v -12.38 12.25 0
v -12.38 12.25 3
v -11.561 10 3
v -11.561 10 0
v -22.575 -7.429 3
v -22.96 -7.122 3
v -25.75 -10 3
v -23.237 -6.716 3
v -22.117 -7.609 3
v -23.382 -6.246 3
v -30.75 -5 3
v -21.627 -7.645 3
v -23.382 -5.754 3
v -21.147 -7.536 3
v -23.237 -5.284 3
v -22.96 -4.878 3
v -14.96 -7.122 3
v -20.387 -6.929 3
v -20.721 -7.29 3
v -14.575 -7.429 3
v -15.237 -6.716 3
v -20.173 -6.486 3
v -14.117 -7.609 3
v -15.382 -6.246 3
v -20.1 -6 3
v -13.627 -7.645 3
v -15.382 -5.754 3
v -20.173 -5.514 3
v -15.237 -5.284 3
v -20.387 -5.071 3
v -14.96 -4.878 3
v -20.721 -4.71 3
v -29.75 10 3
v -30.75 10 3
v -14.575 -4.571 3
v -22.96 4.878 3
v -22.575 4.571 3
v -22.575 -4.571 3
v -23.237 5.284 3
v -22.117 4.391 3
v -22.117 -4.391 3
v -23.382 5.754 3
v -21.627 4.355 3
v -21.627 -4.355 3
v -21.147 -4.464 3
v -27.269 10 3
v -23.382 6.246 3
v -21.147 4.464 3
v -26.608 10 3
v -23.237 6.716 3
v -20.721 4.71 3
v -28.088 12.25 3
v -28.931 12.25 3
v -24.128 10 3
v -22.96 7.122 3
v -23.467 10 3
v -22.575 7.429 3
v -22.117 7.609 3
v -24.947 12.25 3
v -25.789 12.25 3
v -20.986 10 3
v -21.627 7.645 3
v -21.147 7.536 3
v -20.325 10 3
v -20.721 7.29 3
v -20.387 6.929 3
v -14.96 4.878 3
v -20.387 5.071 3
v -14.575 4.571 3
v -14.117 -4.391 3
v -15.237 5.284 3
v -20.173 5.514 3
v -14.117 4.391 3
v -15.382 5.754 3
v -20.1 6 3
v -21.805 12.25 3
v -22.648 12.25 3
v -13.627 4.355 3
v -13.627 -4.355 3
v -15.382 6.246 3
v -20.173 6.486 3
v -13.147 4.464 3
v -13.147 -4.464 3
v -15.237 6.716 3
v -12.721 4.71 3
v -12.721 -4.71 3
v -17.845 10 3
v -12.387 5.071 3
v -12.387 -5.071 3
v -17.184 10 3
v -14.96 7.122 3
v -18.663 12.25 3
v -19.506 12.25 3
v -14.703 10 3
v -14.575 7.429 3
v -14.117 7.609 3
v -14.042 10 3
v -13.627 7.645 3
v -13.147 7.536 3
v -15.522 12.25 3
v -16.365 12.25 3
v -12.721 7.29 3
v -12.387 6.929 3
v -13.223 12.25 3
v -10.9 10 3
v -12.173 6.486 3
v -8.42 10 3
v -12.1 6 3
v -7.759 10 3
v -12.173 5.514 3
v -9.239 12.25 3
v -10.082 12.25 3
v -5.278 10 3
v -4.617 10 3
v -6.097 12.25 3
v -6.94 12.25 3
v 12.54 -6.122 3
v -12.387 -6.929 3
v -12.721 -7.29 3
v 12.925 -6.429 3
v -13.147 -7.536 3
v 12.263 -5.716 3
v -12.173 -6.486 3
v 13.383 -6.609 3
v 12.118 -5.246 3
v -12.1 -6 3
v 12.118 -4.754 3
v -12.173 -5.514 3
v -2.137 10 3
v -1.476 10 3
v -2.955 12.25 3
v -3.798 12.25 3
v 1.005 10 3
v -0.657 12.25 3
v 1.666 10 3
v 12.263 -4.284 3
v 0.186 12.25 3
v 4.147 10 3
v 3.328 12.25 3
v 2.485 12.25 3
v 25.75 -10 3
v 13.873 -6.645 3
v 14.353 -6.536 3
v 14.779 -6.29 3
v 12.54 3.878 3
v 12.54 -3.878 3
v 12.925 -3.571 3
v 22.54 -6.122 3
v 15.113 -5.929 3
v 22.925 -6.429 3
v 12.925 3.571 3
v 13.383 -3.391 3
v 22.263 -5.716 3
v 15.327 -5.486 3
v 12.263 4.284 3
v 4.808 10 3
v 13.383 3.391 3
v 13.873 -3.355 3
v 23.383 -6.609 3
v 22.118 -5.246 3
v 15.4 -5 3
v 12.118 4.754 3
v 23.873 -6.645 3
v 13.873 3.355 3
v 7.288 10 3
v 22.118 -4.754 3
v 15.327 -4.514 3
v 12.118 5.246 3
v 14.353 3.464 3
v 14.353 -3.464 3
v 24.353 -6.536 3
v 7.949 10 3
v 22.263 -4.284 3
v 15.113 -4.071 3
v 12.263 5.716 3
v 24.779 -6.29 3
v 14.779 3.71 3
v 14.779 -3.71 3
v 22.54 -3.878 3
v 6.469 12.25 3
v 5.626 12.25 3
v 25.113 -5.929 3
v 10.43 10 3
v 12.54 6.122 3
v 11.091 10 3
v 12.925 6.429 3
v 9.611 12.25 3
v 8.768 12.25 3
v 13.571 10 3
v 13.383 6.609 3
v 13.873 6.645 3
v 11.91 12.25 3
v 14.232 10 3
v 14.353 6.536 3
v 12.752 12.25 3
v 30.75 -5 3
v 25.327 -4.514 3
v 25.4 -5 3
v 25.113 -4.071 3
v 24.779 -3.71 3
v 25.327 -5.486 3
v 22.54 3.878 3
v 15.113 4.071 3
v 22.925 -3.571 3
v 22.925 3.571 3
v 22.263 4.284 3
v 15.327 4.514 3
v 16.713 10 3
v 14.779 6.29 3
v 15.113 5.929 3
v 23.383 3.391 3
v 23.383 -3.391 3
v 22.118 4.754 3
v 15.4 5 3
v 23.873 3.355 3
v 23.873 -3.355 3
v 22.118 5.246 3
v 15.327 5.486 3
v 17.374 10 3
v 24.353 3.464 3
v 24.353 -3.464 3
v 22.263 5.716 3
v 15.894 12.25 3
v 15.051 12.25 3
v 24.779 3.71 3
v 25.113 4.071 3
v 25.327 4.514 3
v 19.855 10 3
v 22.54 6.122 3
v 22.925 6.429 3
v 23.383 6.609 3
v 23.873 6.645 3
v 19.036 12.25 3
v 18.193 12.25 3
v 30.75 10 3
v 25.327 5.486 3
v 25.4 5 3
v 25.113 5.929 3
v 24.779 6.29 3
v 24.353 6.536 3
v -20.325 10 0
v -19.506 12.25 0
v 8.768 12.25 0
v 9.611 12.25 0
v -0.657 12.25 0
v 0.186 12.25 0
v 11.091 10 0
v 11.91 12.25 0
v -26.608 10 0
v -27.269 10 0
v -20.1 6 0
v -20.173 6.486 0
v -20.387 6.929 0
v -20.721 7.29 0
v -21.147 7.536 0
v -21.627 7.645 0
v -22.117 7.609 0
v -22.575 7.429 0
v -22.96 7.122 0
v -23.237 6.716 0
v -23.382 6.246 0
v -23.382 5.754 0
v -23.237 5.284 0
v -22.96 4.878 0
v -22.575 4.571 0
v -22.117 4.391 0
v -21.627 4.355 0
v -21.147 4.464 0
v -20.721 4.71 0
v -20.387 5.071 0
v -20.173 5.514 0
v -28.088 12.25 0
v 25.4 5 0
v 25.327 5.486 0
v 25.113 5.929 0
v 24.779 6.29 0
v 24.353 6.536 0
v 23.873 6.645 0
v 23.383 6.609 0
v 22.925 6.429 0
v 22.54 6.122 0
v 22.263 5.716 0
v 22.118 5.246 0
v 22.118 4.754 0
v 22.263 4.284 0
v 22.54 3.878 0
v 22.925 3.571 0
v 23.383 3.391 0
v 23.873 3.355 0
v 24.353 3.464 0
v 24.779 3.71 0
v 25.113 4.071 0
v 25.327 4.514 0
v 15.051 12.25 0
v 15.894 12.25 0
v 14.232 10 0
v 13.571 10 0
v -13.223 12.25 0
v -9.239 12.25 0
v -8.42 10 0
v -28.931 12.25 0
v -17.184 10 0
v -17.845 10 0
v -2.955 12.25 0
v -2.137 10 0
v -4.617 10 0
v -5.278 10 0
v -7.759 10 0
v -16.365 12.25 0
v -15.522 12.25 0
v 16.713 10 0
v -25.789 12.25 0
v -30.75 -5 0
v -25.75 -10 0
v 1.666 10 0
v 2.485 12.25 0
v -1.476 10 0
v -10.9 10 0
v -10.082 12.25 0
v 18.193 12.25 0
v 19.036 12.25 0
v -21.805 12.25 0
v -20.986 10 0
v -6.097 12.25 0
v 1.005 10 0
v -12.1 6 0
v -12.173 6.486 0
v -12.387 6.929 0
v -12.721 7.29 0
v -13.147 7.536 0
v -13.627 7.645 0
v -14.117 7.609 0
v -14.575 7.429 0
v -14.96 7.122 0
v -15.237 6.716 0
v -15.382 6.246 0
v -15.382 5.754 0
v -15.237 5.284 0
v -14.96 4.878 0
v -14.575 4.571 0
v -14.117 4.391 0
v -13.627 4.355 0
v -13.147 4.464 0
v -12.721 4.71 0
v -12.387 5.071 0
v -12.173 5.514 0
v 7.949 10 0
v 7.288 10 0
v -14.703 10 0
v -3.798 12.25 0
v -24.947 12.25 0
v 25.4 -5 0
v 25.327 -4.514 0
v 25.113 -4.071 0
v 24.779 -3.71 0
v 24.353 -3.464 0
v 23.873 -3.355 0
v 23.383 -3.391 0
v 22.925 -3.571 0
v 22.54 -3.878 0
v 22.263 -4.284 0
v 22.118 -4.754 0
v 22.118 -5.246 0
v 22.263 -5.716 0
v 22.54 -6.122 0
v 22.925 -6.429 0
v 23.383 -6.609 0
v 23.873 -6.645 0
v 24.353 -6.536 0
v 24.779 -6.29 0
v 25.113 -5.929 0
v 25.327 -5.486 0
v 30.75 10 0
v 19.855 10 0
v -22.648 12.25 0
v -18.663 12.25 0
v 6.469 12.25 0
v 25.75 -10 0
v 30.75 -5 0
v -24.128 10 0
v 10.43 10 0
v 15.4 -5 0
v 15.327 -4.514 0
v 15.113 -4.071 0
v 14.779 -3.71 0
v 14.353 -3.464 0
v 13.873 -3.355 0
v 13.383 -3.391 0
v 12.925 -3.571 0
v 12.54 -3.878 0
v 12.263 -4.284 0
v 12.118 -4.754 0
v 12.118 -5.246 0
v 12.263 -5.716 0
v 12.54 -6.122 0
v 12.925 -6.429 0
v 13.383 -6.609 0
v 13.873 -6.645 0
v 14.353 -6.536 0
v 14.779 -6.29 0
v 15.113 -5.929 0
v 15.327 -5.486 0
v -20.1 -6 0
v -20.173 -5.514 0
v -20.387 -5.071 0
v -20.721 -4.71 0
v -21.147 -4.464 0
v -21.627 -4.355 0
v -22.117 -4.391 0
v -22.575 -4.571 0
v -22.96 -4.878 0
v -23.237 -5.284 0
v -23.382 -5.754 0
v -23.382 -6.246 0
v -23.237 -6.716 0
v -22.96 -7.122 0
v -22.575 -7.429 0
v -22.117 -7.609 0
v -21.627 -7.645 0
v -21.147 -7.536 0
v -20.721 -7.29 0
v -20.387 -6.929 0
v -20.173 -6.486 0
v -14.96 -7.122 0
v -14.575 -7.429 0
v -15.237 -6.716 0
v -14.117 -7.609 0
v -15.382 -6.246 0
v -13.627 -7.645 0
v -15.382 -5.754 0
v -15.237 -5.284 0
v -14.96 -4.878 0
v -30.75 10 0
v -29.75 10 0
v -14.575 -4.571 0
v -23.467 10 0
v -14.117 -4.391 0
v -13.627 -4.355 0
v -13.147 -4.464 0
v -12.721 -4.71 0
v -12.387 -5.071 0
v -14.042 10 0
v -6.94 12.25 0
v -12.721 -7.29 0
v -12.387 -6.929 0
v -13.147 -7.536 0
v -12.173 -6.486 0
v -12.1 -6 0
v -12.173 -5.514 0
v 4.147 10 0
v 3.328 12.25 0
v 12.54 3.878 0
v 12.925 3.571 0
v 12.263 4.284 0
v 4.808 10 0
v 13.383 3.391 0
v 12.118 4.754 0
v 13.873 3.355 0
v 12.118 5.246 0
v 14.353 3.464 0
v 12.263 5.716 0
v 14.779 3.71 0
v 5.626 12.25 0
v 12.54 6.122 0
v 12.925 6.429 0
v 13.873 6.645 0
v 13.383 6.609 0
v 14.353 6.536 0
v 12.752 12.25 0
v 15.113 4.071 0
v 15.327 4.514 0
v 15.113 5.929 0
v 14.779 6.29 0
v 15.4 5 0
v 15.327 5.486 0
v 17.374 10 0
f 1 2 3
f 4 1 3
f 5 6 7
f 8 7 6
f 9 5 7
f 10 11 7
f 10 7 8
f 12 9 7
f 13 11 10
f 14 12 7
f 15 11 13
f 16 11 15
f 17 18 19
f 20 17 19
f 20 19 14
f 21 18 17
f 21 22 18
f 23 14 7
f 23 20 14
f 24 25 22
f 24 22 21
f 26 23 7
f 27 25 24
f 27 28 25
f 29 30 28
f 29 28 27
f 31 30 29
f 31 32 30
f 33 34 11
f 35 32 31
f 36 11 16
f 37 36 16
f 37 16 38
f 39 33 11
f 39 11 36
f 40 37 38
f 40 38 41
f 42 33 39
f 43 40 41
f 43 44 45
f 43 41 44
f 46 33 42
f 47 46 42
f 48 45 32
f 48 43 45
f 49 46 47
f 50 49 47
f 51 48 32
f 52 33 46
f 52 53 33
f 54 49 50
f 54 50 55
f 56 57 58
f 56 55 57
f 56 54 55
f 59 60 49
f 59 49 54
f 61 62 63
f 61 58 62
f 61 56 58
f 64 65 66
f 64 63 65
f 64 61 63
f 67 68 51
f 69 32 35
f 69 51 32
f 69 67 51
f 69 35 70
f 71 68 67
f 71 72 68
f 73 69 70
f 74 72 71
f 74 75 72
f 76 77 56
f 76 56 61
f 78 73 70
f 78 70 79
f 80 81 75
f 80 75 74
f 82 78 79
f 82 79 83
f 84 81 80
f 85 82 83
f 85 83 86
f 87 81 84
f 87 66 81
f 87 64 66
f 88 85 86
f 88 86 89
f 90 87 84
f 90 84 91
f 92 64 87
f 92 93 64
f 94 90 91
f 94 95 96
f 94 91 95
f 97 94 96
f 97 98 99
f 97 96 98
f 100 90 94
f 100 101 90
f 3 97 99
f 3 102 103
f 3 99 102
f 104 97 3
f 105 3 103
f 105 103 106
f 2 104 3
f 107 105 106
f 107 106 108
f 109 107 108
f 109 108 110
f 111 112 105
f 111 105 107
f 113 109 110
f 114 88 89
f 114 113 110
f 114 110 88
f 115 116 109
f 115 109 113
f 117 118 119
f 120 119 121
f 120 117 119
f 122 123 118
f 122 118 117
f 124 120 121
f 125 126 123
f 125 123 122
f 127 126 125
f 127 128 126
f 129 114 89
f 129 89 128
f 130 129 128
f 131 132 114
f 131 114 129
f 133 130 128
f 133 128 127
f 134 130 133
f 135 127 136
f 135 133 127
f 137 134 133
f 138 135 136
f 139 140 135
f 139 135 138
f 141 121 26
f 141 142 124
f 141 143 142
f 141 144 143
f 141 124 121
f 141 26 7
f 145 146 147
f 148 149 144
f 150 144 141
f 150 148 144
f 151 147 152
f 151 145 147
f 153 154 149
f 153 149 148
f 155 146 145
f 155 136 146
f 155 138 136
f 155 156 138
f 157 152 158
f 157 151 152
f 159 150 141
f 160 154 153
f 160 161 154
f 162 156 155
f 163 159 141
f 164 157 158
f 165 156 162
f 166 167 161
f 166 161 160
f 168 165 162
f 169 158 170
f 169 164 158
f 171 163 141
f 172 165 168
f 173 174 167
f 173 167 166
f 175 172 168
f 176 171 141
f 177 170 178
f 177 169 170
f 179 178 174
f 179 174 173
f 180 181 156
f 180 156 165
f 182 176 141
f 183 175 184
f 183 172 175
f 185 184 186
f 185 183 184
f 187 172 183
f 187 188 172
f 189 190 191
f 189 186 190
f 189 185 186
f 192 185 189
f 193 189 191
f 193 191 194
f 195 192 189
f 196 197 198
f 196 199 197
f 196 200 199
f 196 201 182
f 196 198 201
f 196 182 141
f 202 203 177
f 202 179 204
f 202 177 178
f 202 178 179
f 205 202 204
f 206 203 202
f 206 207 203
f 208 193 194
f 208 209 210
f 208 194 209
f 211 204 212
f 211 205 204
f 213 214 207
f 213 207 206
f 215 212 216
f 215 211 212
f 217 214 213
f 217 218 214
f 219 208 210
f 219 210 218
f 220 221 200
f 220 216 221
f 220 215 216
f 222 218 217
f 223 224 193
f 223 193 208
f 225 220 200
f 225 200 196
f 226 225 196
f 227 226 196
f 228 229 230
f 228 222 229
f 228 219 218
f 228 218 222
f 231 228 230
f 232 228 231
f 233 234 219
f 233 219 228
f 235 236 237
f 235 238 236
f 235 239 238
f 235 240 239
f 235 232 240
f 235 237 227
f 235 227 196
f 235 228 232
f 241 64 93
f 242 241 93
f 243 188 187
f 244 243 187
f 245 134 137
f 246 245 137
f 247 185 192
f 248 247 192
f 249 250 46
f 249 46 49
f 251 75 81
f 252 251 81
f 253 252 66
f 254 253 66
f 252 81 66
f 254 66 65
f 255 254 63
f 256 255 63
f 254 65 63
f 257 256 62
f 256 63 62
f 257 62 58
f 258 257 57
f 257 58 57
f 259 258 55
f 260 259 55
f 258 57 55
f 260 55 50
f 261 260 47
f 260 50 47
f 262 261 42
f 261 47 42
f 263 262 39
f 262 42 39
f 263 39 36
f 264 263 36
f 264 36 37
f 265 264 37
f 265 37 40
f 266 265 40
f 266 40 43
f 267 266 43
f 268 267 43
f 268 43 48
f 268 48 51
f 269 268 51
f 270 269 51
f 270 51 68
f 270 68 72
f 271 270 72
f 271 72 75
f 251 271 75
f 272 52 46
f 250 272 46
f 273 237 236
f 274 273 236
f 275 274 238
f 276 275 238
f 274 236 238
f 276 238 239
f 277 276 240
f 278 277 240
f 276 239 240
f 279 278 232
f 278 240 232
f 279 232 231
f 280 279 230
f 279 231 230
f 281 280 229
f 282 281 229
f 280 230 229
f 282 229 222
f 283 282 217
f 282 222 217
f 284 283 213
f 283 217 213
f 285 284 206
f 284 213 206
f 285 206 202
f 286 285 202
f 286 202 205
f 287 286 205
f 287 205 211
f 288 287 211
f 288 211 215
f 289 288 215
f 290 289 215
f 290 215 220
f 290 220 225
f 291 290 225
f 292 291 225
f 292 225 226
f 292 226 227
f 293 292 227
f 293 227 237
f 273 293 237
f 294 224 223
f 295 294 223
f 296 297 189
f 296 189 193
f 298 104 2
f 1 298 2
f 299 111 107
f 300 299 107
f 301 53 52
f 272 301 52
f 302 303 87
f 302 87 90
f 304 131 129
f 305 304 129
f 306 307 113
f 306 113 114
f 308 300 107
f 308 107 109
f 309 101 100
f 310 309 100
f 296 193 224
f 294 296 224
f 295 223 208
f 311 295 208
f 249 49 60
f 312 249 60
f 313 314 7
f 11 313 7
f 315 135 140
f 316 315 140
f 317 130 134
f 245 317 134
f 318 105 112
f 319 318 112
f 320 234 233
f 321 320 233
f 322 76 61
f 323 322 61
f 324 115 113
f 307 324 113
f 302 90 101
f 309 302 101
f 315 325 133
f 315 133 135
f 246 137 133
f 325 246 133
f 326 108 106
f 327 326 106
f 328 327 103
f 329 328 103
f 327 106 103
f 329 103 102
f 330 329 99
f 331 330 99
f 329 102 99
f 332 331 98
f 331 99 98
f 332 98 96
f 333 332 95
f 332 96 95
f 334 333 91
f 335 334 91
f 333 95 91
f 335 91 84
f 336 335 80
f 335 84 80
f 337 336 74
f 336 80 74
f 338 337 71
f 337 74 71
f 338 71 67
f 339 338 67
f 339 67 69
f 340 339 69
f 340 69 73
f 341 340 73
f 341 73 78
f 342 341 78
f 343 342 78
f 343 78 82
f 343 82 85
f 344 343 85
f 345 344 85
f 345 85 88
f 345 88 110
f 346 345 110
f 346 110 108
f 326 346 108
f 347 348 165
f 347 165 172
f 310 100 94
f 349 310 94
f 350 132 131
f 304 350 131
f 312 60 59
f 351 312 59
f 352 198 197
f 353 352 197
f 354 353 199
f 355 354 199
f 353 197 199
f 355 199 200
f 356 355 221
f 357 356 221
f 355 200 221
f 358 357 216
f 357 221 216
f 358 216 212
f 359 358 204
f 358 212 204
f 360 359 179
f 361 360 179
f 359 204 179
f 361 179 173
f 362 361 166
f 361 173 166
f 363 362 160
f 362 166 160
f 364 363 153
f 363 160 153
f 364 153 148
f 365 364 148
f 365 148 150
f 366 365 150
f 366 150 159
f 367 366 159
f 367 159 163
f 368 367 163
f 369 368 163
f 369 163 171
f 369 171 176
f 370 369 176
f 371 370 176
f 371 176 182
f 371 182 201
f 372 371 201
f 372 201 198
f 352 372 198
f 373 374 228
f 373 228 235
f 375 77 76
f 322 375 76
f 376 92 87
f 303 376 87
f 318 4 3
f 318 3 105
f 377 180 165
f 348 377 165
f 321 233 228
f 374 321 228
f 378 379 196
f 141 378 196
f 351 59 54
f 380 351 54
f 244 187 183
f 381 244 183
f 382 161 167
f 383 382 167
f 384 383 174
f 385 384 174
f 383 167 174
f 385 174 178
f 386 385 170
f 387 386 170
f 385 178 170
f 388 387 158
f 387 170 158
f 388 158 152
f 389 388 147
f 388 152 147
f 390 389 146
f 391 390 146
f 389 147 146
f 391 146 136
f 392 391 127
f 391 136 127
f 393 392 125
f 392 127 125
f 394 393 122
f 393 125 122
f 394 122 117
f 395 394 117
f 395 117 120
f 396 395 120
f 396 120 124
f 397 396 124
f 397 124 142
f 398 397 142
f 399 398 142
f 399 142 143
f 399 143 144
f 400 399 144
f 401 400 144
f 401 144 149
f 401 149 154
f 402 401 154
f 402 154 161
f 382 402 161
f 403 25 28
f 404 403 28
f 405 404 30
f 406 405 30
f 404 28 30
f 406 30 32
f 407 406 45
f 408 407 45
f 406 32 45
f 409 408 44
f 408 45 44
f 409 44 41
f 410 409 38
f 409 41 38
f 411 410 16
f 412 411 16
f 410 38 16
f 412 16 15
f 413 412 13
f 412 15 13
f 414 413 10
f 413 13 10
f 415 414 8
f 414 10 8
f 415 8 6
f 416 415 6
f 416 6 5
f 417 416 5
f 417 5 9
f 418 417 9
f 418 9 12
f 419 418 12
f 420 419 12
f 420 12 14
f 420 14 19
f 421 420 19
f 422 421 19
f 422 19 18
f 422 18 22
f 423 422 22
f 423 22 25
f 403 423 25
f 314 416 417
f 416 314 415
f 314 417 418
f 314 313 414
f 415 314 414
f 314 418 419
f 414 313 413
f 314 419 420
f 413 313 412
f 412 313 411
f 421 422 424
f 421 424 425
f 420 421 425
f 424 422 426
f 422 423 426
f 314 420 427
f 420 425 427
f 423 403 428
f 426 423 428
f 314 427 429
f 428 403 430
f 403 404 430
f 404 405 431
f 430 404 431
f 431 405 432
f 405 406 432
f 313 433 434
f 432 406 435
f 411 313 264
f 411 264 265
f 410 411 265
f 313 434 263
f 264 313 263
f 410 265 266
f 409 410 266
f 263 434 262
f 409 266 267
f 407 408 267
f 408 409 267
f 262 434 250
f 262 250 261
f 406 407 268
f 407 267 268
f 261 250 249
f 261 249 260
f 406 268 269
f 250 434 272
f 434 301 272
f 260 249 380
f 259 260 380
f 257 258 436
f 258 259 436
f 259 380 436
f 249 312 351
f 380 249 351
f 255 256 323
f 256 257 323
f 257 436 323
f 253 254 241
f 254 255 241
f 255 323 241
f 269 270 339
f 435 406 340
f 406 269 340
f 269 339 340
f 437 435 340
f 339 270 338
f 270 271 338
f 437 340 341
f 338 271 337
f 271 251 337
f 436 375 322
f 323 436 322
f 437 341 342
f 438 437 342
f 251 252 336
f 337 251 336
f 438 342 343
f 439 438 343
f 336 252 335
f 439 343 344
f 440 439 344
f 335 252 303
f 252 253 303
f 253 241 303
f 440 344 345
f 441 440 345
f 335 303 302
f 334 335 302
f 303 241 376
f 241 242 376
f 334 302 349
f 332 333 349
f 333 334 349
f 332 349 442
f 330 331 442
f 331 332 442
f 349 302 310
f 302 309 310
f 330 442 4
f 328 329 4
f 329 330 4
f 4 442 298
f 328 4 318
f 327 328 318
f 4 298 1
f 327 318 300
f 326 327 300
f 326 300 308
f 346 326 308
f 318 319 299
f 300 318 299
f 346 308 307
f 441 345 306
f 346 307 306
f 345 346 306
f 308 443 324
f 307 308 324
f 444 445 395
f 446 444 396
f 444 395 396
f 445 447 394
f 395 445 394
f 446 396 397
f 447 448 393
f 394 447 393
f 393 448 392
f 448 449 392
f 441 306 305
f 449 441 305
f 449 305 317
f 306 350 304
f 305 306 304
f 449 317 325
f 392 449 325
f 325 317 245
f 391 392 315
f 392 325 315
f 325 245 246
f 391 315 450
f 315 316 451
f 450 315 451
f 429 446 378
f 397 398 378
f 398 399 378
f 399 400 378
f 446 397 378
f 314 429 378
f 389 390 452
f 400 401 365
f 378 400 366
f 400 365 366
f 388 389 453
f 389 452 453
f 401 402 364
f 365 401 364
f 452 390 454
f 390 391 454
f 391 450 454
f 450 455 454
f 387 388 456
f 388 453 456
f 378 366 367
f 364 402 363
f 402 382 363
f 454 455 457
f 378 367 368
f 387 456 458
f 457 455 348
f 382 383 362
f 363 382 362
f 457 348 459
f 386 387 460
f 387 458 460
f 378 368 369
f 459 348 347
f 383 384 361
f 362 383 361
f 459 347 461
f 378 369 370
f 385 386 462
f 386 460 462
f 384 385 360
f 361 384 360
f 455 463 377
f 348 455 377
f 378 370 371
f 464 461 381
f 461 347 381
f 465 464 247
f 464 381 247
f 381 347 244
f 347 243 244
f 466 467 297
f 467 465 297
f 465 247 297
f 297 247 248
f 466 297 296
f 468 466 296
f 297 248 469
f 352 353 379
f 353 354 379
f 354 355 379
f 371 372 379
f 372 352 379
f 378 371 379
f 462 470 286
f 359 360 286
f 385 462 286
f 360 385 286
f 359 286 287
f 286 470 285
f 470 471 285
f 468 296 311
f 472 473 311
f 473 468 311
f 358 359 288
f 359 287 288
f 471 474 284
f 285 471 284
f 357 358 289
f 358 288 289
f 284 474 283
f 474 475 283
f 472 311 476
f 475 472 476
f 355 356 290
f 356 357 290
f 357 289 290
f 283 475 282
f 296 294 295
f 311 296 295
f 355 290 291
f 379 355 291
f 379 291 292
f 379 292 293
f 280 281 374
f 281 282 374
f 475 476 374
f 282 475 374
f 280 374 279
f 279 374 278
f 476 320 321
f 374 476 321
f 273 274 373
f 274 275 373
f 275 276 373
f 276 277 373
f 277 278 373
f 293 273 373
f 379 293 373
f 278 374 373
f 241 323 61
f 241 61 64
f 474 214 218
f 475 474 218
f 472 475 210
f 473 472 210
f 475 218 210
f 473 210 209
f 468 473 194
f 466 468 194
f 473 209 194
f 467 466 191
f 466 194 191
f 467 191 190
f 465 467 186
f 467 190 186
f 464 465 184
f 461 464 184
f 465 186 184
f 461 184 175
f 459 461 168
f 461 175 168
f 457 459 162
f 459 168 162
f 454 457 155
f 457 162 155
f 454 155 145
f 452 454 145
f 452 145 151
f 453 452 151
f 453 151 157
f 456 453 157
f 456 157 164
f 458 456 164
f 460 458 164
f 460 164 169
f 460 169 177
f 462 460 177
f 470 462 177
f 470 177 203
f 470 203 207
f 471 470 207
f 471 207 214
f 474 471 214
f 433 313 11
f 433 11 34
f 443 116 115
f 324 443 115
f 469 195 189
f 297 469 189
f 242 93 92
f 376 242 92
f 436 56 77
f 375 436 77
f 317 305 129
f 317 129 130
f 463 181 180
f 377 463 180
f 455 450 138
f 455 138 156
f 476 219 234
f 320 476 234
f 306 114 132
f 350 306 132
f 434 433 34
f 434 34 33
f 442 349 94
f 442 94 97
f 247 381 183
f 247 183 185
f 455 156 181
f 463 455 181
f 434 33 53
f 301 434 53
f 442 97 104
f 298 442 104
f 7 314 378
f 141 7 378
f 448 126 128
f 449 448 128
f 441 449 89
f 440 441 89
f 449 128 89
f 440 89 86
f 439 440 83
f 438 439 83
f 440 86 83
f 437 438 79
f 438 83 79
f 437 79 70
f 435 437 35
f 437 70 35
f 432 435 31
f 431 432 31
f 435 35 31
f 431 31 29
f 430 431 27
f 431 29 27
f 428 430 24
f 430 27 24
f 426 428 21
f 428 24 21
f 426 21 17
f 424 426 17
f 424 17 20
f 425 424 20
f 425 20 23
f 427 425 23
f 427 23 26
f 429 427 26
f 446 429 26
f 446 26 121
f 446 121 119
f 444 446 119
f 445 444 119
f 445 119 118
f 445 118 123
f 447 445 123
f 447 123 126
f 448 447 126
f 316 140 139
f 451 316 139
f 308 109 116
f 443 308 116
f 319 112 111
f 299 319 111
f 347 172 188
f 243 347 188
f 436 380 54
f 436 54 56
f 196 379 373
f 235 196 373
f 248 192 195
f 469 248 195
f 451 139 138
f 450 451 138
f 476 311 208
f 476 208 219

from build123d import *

# Parameters (mm, degrees)
SKETCH_1_W             = 61.5
SKETCH_1_H             = 20
EXTRUDE_1_DEPTH        = 3
EXTRUDE_2_DEPTH        = 3
PATTERN_LINEAR_1_COUNT = 16
PATTERN_LINEAR_1_PITCH = 3.141592654
CUT_EXTRUDE_1_REACH    = 5
SKETCH_3_R             = 1.65
CUT_EXTRUDE_2_REACH    = 5
SKETCH_4_R             = 1.65
CHAMFER_1_SIZE         = 5


with BuildPart() as part:
    # 草圖1 → 填料-伸長1 (new body)
    with BuildSketch(Plane.XY):
        Rectangle(SKETCH_1_W, SKETCH_1_H)
    extrude(amount=EXTRUDE_1_DEPTH)

    # 草圖2 → 填料-伸長2 (add)
    with BuildSketch(Plane.XY.offset(3)):
        Polygon((-29.75, 10), (-28.931066973, 12.25), (-28.088211111, 12.25), (-27.269278084, 10), align=None)
    extrude_2 = extrude(amount=-EXTRUDE_2_DEPTH)

    # 直線複製排列1: 填料-伸長2 ×16
    with Locations(*[(i * PATTERN_LINEAR_1_PITCH, 0, 0) for i in range(1, PATTERN_LINEAR_1_COUNT)]):
        add(extrude_2)

    # 草圖3 → 除料-伸長1 (cut, up to next)
    with BuildSketch(Plane.XY.offset(3), mode=Mode.PRIVATE) as cut_extrude_1_sk1:
        with Locations((-21.75, 6)):
            Circle(SKETCH_3_R)
    cut_extrude_1_tool1 = extrude(cut_extrude_1_sk1.sketch, amount=-CUT_EXTRUDE_1_REACH, mode=Mode.PRIVATE) & part.part
    add(cut_extrude_1_tool1.solids().sort_by_distance((-21.75, 6, 3))[0], mode=Mode.SUBTRACT)
    # 草圖3 → 除料-伸長1 (cut, up to next)
    with BuildSketch(Plane.XY.offset(3), mode=Mode.PRIVATE) as cut_extrude_1_sk2:
        with Locations((-13.75, 6)):
            Circle(SKETCH_3_R)
    cut_extrude_1_tool2 = extrude(cut_extrude_1_sk2.sketch, amount=-CUT_EXTRUDE_1_REACH, mode=Mode.PRIVATE) & part.part
    add(cut_extrude_1_tool2.solids().sort_by_distance((-13.75, 6, 3))[0], mode=Mode.SUBTRACT)
    # 草圖3 → 除料-伸長1 (cut, up to next)
    with BuildSketch(Plane.XY.offset(3), mode=Mode.PRIVATE) as cut_extrude_1_sk3:
        with Locations((-21.75, -6)):
            Circle(SKETCH_3_R)
    cut_extrude_1_tool3 = extrude(cut_extrude_1_sk3.sketch, amount=-CUT_EXTRUDE_1_REACH, mode=Mode.PRIVATE) & part.part
    add(cut_extrude_1_tool3.solids().sort_by_distance((-21.75, -6, 3))[0], mode=Mode.SUBTRACT)
    # 草圖3 → 除料-伸長1 (cut, up to next)
    with BuildSketch(Plane.XY.offset(3), mode=Mode.PRIVATE) as cut_extrude_1_sk4:
        with Locations((-13.75, -6)):
            Circle(SKETCH_3_R)
    cut_extrude_1_tool4 = extrude(cut_extrude_1_sk4.sketch, amount=-CUT_EXTRUDE_1_REACH, mode=Mode.PRIVATE) & part.part
    add(cut_extrude_1_tool4.solids().sort_by_distance((-13.75, -6, 3))[0], mode=Mode.SUBTRACT)

    # 草圖4 → 除料-伸長2 (cut, up to next)
    with BuildSketch(Plane.XY.offset(3), mode=Mode.PRIVATE) as cut_extrude_2_sk1:
        with Locations((23.75, 5)):
            Circle(SKETCH_4_R)
    cut_extrude_2_tool1 = extrude(cut_extrude_2_sk1.sketch, amount=-CUT_EXTRUDE_2_REACH, mode=Mode.PRIVATE) & part.part
    add(cut_extrude_2_tool1.solids().sort_by_distance((23.75, 5, 3))[0], mode=Mode.SUBTRACT)
    # 草圖4 → 除料-伸長2 (cut, up to next)
    with BuildSketch(Plane.XY.offset(3), mode=Mode.PRIVATE) as cut_extrude_2_sk2:
        with Locations((13.75, 5)):
            Circle(SKETCH_4_R)
    cut_extrude_2_tool2 = extrude(cut_extrude_2_sk2.sketch, amount=-CUT_EXTRUDE_2_REACH, mode=Mode.PRIVATE) & part.part
    add(cut_extrude_2_tool2.solids().sort_by_distance((13.75, 5, 3))[0], mode=Mode.SUBTRACT)
    # 草圖4 → 除料-伸長2 (cut, up to next)
    with BuildSketch(Plane.XY.offset(3), mode=Mode.PRIVATE) as cut_extrude_2_sk3:
        with Locations((23.75, -5)):
            Circle(SKETCH_4_R)
    cut_extrude_2_tool3 = extrude(cut_extrude_2_sk3.sketch, amount=-CUT_EXTRUDE_2_REACH, mode=Mode.PRIVATE) & part.part
    add(cut_extrude_2_tool3.solids().sort_by_distance((23.75, -5, 3))[0], mode=Mode.SUBTRACT)
    # 草圖4 → 除料-伸長2 (cut, up to next)
    with BuildSketch(Plane.XY.offset(3), mode=Mode.PRIVATE) as cut_extrude_2_sk4:
        with Locations((13.75, -5)):
            Circle(SKETCH_4_R)
    cut_extrude_2_tool4 = extrude(cut_extrude_2_sk4.sketch, amount=-CUT_EXTRUDE_2_REACH, mode=Mode.PRIVATE) & part.part
    add(cut_extrude_2_tool4.solids().sort_by_distance((13.75, -5, 3))[0], mode=Mode.SUBTRACT)

    # 導角1
    chamfer_1_edges = [part.edges().sort_by_distance(p)[0] for p in [
        (30.75, -10, 1.5),
        (-30.75, -10, 1.5),
    ]]
    chamfer(chamfer_1_edges, length=CHAMFER_1_SIZE)


solid = part.part
